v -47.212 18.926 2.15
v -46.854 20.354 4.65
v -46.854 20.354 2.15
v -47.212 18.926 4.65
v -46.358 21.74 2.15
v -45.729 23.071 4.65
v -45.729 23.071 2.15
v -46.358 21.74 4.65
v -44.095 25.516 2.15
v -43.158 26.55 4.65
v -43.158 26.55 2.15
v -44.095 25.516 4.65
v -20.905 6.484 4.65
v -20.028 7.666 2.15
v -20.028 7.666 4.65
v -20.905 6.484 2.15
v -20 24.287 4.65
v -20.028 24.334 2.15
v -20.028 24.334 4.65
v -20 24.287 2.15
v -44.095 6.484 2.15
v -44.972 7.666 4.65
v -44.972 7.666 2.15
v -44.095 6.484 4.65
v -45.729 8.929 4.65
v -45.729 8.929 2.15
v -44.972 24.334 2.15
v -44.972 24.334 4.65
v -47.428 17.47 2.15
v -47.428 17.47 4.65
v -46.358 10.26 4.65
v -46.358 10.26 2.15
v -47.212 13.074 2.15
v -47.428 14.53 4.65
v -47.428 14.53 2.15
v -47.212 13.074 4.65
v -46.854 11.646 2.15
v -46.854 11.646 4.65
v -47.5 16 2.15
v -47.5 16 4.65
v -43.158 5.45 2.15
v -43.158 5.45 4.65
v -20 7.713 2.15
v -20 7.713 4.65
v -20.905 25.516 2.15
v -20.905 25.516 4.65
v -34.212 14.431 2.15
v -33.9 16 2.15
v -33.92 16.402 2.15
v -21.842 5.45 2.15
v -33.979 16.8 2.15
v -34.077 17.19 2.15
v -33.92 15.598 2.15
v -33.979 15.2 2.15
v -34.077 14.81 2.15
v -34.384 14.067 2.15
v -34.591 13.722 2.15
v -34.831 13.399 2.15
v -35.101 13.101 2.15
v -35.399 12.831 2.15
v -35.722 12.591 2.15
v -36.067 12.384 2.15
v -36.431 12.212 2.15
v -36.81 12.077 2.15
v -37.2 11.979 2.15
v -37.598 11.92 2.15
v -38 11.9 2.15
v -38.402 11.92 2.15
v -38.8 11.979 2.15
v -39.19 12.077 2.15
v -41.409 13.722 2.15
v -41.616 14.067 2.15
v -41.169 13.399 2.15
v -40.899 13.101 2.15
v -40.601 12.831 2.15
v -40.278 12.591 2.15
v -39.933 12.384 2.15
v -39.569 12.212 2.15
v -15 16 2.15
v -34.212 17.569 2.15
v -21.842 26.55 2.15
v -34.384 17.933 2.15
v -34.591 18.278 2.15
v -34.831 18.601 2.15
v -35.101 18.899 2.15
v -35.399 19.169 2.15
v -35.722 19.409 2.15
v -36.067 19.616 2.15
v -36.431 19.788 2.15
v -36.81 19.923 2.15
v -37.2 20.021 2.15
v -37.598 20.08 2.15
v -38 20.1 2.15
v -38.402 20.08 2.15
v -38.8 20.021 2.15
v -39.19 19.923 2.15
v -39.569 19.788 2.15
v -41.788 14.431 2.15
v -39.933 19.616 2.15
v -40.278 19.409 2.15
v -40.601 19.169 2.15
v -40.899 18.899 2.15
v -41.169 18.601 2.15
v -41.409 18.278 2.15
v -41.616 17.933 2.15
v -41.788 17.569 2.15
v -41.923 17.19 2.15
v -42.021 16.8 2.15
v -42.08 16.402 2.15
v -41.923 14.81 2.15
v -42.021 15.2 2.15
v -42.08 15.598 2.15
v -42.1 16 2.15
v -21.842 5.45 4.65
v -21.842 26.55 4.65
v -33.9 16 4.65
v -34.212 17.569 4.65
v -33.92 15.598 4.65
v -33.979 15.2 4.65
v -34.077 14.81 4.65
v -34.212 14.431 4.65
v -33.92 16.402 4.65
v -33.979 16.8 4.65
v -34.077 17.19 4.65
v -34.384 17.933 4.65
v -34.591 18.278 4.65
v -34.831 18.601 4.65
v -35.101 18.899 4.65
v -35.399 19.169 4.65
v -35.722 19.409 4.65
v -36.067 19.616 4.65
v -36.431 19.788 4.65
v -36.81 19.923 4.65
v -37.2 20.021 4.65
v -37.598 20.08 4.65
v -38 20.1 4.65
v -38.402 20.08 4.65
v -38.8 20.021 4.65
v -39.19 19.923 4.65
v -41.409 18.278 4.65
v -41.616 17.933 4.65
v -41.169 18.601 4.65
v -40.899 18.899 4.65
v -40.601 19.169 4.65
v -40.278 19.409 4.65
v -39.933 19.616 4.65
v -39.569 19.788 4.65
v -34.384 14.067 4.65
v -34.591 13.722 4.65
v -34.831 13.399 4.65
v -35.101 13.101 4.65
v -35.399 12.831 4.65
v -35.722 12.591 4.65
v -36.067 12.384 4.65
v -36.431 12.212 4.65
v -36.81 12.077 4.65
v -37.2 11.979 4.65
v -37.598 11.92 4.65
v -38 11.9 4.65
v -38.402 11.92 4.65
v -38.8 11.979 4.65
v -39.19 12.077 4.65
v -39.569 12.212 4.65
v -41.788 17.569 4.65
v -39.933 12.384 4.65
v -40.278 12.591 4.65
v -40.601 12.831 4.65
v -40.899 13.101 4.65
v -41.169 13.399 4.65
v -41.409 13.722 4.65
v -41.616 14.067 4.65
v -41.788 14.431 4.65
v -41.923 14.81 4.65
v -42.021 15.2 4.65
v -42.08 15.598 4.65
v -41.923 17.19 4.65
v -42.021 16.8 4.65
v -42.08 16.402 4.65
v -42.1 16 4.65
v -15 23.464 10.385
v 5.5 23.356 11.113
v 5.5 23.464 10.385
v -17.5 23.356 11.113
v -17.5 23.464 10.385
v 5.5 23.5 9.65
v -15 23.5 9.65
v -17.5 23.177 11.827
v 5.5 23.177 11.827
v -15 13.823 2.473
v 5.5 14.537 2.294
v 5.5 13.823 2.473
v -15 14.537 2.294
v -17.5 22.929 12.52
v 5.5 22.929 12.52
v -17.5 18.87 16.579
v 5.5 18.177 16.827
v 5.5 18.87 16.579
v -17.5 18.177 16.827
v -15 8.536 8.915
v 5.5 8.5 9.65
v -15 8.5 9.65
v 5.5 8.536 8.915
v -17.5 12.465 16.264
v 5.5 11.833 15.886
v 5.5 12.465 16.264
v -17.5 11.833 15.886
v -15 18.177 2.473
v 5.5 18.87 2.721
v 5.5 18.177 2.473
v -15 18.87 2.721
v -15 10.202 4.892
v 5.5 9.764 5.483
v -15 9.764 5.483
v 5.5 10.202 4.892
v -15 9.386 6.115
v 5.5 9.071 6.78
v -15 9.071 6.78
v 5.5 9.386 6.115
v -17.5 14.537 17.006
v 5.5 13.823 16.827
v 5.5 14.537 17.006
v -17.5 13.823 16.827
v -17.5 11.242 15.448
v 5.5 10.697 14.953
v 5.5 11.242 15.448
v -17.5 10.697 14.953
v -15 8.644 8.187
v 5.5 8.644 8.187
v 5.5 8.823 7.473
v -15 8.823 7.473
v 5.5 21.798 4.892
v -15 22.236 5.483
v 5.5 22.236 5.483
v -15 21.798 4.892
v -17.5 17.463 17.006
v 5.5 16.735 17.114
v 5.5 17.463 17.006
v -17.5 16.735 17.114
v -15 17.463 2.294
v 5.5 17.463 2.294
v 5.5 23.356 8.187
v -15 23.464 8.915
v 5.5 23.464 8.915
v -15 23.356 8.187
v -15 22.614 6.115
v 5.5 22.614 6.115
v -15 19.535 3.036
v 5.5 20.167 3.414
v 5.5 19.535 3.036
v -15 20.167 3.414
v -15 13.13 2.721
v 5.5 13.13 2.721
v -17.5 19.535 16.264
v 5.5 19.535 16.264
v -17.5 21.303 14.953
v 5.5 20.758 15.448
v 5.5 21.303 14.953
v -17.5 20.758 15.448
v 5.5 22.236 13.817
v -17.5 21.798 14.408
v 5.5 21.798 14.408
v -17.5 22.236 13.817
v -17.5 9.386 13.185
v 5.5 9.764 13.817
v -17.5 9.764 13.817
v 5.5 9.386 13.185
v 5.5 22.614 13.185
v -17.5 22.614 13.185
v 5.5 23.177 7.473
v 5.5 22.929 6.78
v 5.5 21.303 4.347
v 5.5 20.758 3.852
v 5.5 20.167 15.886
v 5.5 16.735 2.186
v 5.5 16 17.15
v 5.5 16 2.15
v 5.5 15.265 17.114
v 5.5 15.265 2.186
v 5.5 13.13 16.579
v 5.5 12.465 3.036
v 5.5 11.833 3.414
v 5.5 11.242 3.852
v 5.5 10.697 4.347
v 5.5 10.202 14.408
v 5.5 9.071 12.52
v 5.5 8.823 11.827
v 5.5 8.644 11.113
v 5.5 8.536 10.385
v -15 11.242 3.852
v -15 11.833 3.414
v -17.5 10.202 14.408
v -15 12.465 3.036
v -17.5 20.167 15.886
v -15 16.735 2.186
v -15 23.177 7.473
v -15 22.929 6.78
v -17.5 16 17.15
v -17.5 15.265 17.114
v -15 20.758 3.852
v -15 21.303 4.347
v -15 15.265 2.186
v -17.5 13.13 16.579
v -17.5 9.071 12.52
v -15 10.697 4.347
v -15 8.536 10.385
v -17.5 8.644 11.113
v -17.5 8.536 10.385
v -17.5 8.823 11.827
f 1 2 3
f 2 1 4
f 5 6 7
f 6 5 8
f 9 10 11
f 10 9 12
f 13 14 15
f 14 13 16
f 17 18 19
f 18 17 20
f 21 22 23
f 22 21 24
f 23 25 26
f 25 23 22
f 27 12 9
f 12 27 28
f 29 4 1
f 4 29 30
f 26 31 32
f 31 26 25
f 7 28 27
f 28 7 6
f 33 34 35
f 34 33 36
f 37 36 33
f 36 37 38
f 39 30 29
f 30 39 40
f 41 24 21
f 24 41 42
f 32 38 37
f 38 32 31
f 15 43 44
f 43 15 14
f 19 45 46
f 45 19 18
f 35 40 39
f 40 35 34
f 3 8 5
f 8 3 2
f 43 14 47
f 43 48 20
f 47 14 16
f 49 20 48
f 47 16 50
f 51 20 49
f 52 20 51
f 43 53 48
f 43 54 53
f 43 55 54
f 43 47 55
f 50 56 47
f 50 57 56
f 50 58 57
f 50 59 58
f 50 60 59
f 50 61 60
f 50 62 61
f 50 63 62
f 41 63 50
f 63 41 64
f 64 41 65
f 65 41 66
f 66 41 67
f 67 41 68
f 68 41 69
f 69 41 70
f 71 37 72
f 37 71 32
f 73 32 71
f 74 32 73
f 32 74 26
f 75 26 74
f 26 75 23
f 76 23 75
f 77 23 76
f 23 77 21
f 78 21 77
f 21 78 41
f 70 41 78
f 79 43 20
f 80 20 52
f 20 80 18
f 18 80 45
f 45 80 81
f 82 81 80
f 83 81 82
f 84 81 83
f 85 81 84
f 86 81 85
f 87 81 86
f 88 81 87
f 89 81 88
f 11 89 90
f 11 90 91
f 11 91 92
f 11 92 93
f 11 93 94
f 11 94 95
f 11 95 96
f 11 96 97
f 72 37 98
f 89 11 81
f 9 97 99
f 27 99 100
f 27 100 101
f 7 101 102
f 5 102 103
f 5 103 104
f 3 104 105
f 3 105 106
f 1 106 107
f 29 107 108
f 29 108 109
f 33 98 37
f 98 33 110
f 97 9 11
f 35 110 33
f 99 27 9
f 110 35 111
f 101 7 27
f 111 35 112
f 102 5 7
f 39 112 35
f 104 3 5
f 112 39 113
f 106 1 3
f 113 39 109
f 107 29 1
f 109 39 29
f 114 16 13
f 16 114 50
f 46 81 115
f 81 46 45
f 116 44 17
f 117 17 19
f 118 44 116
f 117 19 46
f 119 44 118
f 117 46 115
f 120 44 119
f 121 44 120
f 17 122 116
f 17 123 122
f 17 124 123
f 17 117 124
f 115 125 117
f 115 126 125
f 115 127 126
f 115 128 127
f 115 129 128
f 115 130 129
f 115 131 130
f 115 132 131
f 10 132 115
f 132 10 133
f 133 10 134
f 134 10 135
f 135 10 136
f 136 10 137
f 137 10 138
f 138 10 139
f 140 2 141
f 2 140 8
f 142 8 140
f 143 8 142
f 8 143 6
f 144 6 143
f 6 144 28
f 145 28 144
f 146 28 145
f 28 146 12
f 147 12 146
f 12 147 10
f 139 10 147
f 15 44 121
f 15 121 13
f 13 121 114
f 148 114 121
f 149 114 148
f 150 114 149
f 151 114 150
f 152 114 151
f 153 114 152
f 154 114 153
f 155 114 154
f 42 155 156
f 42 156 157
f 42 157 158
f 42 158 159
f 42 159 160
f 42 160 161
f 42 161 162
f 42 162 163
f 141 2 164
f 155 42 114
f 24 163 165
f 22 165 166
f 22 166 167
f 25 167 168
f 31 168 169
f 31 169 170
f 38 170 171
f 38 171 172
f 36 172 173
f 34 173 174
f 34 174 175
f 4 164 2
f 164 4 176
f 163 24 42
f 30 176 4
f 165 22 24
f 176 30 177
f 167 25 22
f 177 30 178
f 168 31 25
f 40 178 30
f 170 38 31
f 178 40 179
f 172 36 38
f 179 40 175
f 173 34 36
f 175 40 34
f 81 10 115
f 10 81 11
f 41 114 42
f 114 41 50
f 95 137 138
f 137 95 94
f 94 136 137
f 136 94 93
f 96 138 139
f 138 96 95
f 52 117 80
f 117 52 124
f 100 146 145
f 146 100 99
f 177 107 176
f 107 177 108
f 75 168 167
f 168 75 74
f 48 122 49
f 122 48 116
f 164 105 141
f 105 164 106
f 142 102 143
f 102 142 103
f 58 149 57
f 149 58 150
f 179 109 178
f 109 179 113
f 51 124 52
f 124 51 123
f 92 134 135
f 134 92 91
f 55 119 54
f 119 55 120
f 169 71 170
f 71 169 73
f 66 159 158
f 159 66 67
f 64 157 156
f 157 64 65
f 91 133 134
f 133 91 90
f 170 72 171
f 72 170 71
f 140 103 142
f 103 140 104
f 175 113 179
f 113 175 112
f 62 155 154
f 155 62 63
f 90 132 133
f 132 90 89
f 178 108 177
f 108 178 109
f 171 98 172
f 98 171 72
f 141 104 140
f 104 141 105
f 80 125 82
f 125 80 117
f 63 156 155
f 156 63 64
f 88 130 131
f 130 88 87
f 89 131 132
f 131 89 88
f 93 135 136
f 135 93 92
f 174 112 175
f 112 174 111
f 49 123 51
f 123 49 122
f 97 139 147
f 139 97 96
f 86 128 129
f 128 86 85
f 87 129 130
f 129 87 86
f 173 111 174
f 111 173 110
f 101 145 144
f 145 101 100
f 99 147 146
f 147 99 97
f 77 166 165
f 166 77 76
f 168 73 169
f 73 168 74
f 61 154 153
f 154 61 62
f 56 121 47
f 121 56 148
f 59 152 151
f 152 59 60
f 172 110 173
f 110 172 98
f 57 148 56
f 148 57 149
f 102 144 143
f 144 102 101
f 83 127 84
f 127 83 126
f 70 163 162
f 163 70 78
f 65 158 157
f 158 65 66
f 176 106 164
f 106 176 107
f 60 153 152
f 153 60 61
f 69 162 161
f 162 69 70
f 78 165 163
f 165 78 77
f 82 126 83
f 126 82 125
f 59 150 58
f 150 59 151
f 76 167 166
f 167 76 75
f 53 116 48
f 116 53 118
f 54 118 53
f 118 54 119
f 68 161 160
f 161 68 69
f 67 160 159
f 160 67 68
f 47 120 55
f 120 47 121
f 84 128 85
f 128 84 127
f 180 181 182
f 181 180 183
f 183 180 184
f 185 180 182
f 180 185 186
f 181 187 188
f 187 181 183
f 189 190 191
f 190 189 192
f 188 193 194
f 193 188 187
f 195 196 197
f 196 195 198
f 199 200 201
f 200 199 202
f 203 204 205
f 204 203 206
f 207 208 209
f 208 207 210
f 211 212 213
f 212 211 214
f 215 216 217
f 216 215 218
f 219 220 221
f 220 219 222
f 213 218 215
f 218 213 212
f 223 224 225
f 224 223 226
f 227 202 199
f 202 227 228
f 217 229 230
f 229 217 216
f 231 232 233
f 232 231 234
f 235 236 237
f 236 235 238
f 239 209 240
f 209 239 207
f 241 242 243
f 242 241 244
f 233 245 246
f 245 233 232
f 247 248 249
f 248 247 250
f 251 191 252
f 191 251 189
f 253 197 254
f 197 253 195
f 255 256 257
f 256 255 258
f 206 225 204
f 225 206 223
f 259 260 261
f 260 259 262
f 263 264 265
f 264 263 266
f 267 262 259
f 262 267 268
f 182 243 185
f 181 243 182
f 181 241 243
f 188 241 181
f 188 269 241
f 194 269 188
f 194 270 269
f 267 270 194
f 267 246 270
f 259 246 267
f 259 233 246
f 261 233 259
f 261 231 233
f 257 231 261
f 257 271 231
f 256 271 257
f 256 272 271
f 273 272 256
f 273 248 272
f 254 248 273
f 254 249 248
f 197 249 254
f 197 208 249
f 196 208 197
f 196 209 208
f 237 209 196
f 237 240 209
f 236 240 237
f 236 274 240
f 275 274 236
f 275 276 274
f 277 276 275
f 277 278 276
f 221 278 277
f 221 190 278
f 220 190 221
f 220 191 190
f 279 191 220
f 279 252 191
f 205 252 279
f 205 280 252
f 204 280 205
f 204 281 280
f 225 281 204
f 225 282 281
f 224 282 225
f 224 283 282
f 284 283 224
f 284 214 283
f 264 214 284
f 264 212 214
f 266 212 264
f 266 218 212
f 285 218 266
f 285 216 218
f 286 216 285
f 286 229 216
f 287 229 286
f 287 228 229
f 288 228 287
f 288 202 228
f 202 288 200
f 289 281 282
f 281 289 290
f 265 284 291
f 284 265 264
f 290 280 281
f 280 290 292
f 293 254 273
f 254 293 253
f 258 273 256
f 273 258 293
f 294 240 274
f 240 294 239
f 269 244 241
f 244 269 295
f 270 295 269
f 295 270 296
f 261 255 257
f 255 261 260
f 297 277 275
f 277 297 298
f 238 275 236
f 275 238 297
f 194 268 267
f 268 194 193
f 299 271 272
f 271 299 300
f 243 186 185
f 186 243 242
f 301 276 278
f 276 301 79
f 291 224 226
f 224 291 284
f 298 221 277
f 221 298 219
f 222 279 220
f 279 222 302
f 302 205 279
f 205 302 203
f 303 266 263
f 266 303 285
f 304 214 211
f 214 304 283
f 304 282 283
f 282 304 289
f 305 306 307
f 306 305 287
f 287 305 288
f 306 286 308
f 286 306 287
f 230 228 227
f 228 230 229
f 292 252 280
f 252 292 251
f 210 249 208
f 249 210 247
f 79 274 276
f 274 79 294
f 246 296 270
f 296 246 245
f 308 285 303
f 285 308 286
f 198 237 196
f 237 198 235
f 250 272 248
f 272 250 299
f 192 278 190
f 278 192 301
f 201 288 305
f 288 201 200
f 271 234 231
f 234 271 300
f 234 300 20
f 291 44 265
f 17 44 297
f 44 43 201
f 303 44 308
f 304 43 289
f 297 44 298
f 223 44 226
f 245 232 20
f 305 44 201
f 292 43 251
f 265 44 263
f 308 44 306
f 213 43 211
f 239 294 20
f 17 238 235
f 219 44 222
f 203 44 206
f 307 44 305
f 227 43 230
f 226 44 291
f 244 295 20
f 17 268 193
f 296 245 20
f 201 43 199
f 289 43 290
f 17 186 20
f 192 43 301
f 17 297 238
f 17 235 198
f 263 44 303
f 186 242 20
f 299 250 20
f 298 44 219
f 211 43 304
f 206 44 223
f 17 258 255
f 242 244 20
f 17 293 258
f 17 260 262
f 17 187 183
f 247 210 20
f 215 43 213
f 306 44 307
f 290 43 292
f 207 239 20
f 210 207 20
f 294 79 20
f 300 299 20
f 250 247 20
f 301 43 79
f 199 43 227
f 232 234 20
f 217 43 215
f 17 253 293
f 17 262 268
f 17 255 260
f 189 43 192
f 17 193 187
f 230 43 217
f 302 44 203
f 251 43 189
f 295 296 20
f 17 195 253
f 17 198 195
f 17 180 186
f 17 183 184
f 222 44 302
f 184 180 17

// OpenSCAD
// file: crimp_terminal.scad
include <parameters.scad>
use <colors.scad>

module crimp_terminal_awg2_0() {
  module base_shape() {
    difference() {
      intersection() {
        translate([0, -15 + 8 / 2 + 5.5, 0])
          cylinder(d=30, h=2.5);
        cube([21.1, 100, 100], center=true);
      }
      cylinder(d=8.2, h=100, center=true);
    }
    translate([0, -15 + 8 / 2 + 5.5 - 15, 7.5])
      rotate([90, 0, 0])
        cylinder(d=15, h=53 - 30);
  }

  module modifier() {
    translate([0, -15 + 8 / 2 + 5.5 - 15, 0])
      cube([100, 5, 100], center=true);
  }

  copper() union() {
      hull() {
        intersection() {
          base_shape();
          modifier();
        }
      }
      difference() {
        base_shape();
        modifier();
      }
    }
}

crimp_terminal_awg2_0();
// file: colors.scad
module copper() {
  color("#b87333") children();
}

module nickel() {
  color("#9a9590") children();
}

module pcb() {
  color("#008c32") children();
}

module clear_acrylic() {
  color("#ffffffc0") children();
}
// file: parameters.scad
$fn = 64;

h = 70.3; // cell max height
d = 21.5; // cell max diameter

available_y = 19.5 * 25.4;

aluminum_thickness = 0.04 * 25.4; // 5052 H32 Aluminum for the case
case_dim_x = 137; // external dimensions, must be 137 to match the EIG battery box
case_dim_y = 228; // 235 is the max, can be smaller
case_dim_z = 355; // 

external_walls = 3; // acrylic

base_plate_dim_x = case_dim_x - 2 * external_walls;
base_plate_dim_y = case_dim_y - 2 * external_walls;

cell_isolation = 1; // minimum separation between cells not in parallel

plate_disk_dia = 14;
copper_width = 10;
copper_length = 9.8 * d;

nickel_width = 8;
nickel_length = 5.8 * d; // length of the nickel strip to connect 6 cells

plate_slot_length = 8;
plate_slot_width = 0.7;
copper_plate_thickness = 0.15;
nickel_plate_thickness = 0.15;
strips_pocket_height = 1;

plates_thickness = copper_plate_thickness + nickel_plate_thickness;

bulkhead_thickness = 20;

strips_clearance = 0.5;
holder_pocket_height = 5;
holder_walls = 0.5;

exploded = $t * 50;

inlet_stack_height = 20;
outlet_walls = 3;

m3_insert_od = 4.6; // 5mm OD minus some plastic to melt
m3_insert_length = 4 + 4; // 4 mm more than the insert length

m4_insert_od = 5.3; // this is the diameter of the hole, it must be smaller than the insert’s maximum OD
m4_insert_length = 8; // 2 mm more than the insert length

cell_holder_stack_height = 0.3;

strips_insulator_stack_height = 1.2;

module_60_height = h + cell_holder_stack_height * 2 + strips_insulator_stack_height * 2 + 7 * exploded;

large_spacer_stack_height = 7;

module_120_height = module_60_height * 2 + large_spacer_stack_height + exploded;

module_240_height = module_120_height * 2 + large_spacer_stack_height * 3 + exploded;

inlet_walls = 3;

ring_terminal_cutout_depth = 3;
busbar_cutout_depth = 3;
busbar_thickness = 1;
// main file
include <parameters.scad>;
use <colors.scad>;
use <crimp_terminal.scad>;

module terminal_busbar() {
  copper()for (z = [0, busbar_thickness + copper_plate_thickness]) {
    translate([0, 0, z])
      linear_extrude(height=busbar_thickness) {
        // DXF generated with KiCad
        import("terminal_busbar.dxf");
      }
  }
  translate([-38, 16, 2 * busbar_thickness + copper_plate_thickness])
    rotate([0, 0, 90])
      crimp_terminal_awg2_0();
}

terminal_busbar();
